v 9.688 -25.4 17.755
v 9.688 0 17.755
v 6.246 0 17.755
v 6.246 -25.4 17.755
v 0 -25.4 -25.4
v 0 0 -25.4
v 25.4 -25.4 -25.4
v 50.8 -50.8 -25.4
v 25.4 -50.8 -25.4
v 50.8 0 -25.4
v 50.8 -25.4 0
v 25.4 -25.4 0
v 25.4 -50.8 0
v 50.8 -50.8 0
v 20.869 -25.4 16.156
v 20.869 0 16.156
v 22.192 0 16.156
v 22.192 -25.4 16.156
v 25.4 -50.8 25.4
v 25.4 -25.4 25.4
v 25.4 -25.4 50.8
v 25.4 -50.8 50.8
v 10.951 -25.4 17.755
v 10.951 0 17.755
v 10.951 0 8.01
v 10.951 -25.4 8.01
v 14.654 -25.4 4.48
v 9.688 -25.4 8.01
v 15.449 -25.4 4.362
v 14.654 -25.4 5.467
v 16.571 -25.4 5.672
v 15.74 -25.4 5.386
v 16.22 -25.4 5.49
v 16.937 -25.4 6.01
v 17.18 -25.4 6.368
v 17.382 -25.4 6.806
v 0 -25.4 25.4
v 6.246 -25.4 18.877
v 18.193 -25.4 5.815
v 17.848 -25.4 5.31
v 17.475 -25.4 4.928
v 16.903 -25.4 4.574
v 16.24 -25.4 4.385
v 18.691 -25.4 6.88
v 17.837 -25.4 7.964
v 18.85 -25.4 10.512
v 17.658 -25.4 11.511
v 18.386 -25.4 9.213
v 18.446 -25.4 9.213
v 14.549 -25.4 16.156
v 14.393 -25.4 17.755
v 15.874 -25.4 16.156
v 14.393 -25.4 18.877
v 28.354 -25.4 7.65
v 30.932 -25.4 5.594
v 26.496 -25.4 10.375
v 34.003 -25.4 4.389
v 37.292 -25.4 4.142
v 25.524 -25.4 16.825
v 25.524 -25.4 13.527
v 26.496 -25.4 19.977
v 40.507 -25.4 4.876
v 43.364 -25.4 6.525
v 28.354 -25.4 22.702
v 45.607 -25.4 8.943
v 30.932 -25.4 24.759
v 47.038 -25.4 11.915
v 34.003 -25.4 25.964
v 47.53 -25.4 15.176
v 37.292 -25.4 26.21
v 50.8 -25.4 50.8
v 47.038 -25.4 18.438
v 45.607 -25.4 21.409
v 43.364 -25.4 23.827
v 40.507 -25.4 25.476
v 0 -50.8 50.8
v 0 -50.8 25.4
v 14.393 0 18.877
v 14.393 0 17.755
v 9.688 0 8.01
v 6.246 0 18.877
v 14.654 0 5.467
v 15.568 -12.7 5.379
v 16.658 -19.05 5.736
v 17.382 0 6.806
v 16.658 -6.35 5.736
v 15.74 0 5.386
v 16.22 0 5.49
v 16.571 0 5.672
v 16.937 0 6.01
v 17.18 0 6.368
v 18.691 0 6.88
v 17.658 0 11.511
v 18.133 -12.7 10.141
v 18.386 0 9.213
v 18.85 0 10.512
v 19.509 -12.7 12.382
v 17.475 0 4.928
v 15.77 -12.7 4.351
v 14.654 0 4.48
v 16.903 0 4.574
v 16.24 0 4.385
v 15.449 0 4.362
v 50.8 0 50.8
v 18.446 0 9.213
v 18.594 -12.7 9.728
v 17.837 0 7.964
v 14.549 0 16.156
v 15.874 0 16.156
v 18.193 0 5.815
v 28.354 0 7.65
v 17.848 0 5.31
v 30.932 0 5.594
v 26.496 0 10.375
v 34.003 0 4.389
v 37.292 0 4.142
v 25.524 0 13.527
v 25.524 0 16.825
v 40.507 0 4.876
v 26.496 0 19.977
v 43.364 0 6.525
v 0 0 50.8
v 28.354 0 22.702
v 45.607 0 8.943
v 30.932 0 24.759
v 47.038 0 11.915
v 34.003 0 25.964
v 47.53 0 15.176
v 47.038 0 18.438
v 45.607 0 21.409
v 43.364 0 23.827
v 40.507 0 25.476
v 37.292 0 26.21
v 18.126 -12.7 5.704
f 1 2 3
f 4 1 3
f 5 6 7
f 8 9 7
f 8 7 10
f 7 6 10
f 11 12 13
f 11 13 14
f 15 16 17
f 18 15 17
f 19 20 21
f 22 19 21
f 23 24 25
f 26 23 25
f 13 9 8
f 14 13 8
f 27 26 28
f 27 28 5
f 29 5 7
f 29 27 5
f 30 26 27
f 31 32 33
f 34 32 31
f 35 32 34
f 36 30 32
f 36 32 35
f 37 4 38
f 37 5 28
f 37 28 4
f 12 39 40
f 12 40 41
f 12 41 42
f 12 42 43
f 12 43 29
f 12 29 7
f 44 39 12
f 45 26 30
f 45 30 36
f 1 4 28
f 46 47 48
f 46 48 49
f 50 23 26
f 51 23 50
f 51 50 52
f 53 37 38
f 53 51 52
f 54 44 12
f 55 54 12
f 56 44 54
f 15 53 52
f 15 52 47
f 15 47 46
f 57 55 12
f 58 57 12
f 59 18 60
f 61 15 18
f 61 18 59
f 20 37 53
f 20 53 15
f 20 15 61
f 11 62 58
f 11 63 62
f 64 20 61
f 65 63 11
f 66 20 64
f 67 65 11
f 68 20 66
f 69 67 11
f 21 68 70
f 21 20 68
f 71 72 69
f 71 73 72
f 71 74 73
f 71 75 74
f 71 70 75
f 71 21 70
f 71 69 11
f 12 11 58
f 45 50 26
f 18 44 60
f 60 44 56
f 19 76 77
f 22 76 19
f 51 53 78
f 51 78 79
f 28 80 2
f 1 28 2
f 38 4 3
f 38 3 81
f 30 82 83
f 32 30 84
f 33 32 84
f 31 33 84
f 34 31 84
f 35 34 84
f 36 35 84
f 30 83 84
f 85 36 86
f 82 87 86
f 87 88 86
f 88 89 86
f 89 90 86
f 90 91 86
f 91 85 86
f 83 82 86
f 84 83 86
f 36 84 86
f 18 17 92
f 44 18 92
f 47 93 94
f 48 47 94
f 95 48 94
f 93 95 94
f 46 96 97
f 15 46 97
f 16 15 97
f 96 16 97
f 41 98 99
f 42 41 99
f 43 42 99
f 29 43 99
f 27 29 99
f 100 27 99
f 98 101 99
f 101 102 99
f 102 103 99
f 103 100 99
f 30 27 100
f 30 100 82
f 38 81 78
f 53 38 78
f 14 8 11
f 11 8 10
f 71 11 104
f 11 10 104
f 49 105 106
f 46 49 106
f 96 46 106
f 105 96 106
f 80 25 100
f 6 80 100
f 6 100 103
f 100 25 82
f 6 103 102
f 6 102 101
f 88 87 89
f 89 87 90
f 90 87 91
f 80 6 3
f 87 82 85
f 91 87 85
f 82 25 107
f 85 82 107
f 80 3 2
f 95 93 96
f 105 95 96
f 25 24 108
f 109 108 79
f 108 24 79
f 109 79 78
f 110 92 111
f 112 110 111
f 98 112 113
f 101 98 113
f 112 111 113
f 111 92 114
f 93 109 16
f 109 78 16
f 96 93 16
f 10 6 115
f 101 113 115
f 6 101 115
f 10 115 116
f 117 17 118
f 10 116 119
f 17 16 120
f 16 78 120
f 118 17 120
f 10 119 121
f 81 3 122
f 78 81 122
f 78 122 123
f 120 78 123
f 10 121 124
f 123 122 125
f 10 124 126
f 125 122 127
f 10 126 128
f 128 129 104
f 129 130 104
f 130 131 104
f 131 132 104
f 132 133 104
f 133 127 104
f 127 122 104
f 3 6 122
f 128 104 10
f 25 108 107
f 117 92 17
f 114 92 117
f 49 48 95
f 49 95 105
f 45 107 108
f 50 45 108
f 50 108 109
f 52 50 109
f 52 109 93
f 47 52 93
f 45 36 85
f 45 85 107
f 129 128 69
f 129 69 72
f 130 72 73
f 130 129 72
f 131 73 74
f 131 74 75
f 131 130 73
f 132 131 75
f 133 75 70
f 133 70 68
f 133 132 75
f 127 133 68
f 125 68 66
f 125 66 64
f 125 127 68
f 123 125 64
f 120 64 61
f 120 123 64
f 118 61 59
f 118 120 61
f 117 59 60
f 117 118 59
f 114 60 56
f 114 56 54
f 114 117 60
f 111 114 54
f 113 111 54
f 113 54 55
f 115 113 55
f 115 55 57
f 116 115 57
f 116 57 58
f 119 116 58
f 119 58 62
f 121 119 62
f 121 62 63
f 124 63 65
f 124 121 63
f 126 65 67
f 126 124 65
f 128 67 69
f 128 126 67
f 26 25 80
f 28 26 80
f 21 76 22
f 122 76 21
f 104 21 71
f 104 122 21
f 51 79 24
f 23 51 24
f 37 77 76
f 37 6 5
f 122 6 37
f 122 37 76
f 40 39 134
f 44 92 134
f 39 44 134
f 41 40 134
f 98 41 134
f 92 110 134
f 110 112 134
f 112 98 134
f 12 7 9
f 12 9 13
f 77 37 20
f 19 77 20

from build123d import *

# Parameters (mm, degrees)
F0_W     = 25.4
F0_H     = 25.4
F1_DEPTH = 50.8
F2_R     = 11.0649221301
F3_DEPTH = 25.4
F4_W     = 25.4
F4_H     = 25.4
F5_DEPTH = 50.8


with BuildPart() as f1:
    # F0 (on Front) → F1 (new body)
    with BuildSketch(Plane.XZ):
        with Locations((38.1, -12.7)):
            Rectangle(F0_W, F0_H)
    extrude(amount=F1_DEPTH)

    # F2 (on Front) → F3 (join)
    with BuildSketch(Plane.XZ):
        Polygon((0, 0), (0, -25.4), (25.4, -25.4), (25.4, 0), (50.8, 0), (50.8, 25.4), (50.8, 50.8), (25.4, 50.8), (25.4, 25.4), (0, 25.4), align=None)
        with BuildLine():
            Line((17.8367029688, 7.9644425954), (14.5494888325, 16.1563134241))
            Line((14.5494888325, 16.1563134241), (15.8743645734, 16.1563134241))
            Line((15.8743645734, 16.1563134241), (17.6583085692, 11.5109232591))
            add(Edge.make_bspline(
                [(17.6583085692, 11.5109232591), (18.2434421998, 9.9196452148), (18.3861577195, 9.2132033925)],
                knots=[0, 0, 0, 1, 1, 1], degree=2))
            Line((18.3861577195, 9.2132033925), (18.4456225193, 9.2132033925))
            add(Edge.make_bspline(
                [(18.4456225193, 9.2132033925), (18.5407661991, 9.5937781116), (18.8499831584, 10.5119146214)],
                knots=[0, 0, 0, 1, 1, 1], degree=2))
            add(Edge.make_bspline(
                [(18.8499831584, 10.5119146214), (19.1592001176, 11.4300511313), (20.8694077616, 16.1563134241)],
                knots=[0, 0, 0, 1, 1, 1], degree=2))
            Line((20.8694077616, 16.1563134241), (22.1919049105, 16.1563134241))
            Line((22.1919049105, 16.1563134241), (18.6906174947, 6.879804646))
            add(Edge.make_bspline(
                [(18.6906174947, 6.879804646), (18.169705848, 5.5049784733), (17.4751569856, 4.9281699146)],
                knots=[0, 0, 0, 1, 1, 1], degree=2))
            add(Edge.make_bspline(
                [(17.4751569856, 4.9281699146), (16.7806081233, 4.351361356), (15.7697065256, 4.351361356)],
                knots=[0, 0, 0, 1, 1, 1], degree=2))
            add(Edge.make_bspline(
                [(15.7697065256, 4.351361356), (15.203601631, 4.351361356), (14.6541468803, 4.4798053237)],
                knots=[0, 0, 0, 1, 1, 1], degree=2))
            Line((14.6541468803, 4.4798053237), (14.6541468803, 5.4669210013))
            add(Edge.make_bspline(
                [(14.6541468803, 5.4669210013), (15.0632647033, 5.3789130976), (15.5675262061, 5.3789130976)],
                knots=[0, 0, 0, 1, 1, 1], degree=2))
            add(Edge.make_bspline(
                [(15.5675262061, 5.3789130976), (16.8400729231, 5.3789130976), (17.3823918978, 6.8060682942)],
                knots=[0, 0, 0, 1, 1, 1], degree=2))
            Line((17.3823918978, 6.8060682942), (17.8367029688, 7.9644425954))
        make_face(mode=Mode.SUBTRACT)
        Polygon((10.950679145, 17.7547272443), (10.950679145, 8.0096358433), (9.687646796, 8.0096358433), (9.687646796, 17.7547272443), (6.2458241801, 17.7547272443), (6.2458241801, 18.8774226657), (14.3925017609, 18.8774226657), (14.3925017609, 17.7547272443), align=None, mode=Mode.SUBTRACT)
        with Locations((36.4649221301, 15.1761500165)):
            Circle(F2_R, mode=Mode.SUBTRACT)
    extrude(amount=F3_DEPTH)

    # F4 (on Front) → F5 (join)
    with BuildSketch(Plane.XZ):
        with Locations((12.7, 38.1)):
            Rectangle(F4_W, F4_H)
    extrude(amount=F5_DEPTH)


solid = f1.part
